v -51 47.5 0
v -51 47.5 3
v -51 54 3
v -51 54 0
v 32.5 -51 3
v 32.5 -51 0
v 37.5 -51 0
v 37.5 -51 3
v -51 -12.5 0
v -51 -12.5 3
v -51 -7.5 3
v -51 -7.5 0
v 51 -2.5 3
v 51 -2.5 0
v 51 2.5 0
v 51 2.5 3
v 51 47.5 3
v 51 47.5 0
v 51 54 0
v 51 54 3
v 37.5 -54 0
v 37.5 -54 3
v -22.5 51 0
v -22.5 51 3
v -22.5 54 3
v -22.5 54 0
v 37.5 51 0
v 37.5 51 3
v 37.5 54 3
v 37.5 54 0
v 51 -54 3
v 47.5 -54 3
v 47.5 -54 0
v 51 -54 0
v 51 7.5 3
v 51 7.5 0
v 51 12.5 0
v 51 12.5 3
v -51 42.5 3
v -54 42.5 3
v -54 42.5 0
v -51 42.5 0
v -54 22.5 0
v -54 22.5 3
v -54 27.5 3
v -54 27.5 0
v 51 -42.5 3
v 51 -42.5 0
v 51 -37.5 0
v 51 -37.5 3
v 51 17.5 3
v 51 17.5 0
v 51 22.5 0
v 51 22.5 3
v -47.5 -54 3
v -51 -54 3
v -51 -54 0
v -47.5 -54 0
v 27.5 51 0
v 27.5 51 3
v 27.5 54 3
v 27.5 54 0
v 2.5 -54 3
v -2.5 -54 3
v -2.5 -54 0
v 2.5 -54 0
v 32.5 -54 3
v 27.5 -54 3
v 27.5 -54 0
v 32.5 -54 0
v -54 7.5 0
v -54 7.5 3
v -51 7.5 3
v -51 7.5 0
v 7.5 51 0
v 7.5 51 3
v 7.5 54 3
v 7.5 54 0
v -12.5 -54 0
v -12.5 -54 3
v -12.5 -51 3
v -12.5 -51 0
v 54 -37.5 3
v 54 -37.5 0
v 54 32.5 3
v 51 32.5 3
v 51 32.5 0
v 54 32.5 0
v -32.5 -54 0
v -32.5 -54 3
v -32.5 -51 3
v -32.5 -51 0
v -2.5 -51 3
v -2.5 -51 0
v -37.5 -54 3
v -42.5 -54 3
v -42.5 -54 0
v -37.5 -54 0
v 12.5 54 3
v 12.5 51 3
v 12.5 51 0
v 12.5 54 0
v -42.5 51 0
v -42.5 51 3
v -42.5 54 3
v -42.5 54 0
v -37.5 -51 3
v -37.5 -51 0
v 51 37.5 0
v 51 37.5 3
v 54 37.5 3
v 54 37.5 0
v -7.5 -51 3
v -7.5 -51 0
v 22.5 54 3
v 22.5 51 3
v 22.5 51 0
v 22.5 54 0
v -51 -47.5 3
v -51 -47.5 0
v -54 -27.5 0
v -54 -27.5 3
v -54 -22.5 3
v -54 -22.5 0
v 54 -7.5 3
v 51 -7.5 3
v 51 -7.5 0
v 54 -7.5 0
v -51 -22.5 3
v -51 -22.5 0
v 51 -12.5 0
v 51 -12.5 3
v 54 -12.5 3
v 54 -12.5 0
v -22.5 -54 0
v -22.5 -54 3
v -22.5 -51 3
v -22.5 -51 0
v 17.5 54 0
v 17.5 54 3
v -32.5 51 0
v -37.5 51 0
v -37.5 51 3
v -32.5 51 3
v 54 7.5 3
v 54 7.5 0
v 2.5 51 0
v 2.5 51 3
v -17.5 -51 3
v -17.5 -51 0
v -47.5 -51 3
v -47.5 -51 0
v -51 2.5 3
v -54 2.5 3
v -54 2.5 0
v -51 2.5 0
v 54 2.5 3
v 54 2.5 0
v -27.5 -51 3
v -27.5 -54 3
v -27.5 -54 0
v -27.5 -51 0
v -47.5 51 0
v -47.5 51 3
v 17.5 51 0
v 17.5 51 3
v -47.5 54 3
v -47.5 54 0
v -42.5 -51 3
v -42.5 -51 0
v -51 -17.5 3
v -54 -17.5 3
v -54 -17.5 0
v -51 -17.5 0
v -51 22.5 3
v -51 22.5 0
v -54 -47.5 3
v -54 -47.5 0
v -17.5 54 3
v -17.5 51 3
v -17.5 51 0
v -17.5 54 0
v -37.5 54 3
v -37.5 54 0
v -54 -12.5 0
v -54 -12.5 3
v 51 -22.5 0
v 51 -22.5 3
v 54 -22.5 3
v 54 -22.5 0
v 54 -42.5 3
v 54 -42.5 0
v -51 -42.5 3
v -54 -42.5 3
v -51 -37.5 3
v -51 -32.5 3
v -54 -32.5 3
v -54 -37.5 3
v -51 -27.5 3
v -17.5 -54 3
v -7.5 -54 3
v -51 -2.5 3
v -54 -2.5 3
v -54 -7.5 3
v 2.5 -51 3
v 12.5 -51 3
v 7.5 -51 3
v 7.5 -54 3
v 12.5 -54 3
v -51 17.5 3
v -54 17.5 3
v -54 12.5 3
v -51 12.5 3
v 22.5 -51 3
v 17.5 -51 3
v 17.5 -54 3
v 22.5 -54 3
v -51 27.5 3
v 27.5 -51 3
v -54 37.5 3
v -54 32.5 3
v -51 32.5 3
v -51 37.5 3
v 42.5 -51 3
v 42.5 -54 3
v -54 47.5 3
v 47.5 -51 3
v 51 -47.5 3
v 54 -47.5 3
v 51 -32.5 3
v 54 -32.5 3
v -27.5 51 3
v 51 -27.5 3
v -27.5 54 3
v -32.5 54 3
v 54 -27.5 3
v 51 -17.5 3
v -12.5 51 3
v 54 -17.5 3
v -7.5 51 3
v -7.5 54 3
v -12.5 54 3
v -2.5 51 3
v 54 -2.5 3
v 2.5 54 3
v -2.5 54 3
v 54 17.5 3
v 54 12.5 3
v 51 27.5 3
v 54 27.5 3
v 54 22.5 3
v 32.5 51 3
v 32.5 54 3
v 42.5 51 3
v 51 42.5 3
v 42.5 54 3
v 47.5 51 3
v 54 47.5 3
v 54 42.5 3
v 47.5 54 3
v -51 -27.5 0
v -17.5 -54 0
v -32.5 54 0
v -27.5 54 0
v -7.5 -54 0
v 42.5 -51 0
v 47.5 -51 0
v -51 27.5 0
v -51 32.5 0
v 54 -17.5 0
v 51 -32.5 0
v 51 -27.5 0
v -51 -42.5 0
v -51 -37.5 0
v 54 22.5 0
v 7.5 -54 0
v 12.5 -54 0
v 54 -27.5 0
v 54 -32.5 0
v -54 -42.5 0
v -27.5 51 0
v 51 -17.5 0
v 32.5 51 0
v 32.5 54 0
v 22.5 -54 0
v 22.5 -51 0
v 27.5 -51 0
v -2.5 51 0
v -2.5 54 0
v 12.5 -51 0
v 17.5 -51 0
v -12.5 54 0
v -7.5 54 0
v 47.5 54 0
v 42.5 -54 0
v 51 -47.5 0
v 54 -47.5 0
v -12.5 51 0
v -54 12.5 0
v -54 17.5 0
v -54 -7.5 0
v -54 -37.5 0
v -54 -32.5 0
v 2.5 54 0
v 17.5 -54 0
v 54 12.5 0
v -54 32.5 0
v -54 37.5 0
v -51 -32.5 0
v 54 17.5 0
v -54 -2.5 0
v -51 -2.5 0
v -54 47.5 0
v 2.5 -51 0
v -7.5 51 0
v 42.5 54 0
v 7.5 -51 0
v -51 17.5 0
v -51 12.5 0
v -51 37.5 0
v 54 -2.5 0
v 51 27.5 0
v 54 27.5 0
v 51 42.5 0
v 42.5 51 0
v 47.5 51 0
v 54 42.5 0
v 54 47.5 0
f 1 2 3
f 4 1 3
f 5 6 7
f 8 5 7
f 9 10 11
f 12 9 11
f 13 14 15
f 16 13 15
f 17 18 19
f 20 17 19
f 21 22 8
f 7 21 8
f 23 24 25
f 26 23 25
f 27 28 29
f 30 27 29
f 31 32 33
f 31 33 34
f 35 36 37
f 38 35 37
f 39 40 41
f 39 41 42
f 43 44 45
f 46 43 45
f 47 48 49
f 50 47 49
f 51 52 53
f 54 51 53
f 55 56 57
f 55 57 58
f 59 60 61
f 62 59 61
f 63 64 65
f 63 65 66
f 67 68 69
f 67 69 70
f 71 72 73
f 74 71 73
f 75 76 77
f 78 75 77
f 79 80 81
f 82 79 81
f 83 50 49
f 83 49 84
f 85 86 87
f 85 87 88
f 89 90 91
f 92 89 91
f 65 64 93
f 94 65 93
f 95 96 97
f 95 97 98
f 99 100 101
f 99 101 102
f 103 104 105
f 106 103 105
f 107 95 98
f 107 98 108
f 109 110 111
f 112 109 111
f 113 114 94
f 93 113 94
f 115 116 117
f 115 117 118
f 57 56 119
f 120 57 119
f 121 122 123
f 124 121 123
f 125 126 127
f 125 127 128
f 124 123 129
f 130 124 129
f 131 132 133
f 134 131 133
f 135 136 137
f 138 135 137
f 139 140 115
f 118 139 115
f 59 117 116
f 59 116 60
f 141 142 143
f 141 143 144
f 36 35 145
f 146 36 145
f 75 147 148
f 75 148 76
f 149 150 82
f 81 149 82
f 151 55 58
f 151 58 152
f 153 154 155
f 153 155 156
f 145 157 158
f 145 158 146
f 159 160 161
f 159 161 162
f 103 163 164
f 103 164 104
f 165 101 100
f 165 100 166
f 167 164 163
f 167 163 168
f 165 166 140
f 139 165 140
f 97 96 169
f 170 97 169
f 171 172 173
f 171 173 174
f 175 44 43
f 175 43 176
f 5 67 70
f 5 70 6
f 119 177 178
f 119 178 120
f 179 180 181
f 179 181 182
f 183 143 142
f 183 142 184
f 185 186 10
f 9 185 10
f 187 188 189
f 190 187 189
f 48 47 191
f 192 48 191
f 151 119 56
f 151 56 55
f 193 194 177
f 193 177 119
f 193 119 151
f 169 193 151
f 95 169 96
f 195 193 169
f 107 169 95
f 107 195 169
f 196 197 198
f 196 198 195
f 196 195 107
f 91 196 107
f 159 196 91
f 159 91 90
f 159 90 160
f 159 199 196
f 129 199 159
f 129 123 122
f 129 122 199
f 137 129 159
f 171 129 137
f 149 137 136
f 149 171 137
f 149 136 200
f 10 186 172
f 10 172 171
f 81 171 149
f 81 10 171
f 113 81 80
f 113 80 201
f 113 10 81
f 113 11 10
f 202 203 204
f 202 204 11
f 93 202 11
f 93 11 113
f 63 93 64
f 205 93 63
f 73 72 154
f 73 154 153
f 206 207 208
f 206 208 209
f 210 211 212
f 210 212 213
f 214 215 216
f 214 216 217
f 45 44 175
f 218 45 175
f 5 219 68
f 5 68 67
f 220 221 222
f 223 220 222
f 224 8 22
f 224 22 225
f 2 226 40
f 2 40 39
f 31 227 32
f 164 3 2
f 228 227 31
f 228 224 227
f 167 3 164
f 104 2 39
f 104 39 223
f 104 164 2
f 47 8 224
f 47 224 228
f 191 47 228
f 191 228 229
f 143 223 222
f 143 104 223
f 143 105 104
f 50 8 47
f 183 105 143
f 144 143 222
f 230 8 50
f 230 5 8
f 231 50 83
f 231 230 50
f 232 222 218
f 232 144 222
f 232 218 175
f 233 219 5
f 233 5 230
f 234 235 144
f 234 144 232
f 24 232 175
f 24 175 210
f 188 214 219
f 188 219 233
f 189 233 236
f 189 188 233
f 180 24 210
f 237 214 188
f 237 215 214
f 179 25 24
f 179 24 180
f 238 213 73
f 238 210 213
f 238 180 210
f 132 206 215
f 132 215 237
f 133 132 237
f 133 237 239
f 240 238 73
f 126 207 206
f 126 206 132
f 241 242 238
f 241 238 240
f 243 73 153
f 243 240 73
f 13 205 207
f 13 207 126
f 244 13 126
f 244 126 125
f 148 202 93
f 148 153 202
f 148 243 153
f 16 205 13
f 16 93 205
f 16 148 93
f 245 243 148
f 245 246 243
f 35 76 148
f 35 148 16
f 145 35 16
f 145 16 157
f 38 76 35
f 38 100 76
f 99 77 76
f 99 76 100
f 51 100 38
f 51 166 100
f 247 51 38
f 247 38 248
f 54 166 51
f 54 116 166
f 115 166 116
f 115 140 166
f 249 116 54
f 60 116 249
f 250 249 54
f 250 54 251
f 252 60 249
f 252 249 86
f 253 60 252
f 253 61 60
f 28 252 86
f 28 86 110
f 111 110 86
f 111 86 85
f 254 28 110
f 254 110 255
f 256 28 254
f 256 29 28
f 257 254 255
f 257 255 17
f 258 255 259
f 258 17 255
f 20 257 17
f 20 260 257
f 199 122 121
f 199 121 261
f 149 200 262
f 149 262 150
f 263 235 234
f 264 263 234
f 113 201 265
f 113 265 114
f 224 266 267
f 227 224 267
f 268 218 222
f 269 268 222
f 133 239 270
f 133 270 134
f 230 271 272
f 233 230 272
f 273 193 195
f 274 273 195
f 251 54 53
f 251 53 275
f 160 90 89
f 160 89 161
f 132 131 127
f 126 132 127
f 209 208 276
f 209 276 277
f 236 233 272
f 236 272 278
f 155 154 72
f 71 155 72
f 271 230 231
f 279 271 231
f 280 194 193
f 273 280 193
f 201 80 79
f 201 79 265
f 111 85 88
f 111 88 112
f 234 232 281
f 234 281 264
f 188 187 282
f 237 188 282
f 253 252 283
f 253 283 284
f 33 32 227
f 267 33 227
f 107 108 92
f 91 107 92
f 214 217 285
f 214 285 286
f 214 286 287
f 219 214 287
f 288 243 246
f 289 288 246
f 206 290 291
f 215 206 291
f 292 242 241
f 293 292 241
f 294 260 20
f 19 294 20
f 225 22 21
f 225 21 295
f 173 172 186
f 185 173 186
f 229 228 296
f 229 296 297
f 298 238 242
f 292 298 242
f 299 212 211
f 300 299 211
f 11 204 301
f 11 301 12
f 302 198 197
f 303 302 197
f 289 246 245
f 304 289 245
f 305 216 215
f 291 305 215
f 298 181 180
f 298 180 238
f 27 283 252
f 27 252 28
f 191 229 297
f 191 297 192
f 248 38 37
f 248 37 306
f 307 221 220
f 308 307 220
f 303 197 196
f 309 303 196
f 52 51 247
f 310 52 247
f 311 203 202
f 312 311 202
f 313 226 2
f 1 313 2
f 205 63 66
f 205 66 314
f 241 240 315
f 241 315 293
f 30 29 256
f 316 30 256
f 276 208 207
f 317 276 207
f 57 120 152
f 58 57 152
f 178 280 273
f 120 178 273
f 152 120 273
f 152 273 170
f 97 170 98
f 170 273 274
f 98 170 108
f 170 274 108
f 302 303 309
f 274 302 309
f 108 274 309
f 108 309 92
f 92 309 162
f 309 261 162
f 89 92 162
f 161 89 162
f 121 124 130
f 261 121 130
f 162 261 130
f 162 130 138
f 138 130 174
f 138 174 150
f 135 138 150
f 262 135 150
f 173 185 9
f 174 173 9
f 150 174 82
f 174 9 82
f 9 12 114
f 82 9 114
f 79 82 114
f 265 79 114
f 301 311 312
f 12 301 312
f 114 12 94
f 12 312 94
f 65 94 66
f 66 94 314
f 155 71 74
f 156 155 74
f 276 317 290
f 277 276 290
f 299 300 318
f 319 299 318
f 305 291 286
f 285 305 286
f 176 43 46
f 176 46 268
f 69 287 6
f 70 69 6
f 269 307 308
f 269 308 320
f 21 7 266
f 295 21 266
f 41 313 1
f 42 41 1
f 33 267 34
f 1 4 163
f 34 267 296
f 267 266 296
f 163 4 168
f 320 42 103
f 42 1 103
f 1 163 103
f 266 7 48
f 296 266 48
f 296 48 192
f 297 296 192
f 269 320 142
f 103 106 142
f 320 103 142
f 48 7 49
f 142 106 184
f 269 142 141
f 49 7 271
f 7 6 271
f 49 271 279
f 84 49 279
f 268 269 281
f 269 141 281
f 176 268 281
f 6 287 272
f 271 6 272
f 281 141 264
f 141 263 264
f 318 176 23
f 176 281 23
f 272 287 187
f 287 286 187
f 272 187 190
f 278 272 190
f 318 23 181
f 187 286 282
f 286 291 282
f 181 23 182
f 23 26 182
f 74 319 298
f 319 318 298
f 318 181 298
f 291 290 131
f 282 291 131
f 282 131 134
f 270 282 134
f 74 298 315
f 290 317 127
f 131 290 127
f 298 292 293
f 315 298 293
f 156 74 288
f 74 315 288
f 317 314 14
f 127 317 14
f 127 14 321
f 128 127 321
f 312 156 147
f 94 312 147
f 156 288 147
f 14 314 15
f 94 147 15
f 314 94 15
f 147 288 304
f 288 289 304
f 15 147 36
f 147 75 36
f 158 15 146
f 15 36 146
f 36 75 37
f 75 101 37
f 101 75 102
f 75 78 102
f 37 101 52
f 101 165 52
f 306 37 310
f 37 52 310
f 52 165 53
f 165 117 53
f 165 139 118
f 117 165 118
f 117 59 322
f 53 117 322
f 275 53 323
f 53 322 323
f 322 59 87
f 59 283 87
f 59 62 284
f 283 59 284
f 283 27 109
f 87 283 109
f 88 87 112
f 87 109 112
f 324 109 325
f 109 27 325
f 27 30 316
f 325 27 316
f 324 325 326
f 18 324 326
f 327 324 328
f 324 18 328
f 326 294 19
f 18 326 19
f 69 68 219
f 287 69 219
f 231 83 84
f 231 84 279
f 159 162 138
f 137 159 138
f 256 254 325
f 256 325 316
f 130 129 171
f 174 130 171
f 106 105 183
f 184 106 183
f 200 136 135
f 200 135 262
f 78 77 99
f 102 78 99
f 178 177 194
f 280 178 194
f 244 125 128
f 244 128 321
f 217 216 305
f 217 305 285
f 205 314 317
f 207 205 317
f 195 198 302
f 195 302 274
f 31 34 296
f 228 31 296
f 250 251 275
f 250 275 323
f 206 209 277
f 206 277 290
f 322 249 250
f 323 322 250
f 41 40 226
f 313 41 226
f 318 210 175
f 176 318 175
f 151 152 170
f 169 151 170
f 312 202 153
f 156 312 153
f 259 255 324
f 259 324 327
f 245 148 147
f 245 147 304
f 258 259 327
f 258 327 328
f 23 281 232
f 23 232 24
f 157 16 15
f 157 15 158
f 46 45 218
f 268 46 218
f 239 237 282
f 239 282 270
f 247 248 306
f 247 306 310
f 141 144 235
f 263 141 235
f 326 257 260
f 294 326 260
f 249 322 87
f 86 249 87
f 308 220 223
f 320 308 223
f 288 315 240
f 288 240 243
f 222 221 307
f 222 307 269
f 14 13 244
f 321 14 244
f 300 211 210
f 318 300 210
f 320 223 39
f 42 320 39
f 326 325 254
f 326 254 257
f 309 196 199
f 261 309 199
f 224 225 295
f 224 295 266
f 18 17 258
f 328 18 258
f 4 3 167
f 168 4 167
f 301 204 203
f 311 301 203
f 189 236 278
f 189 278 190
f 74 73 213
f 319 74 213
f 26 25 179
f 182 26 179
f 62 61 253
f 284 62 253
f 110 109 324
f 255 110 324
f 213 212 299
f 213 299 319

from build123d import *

# Parameters (mm, degrees)
F0_W     = 102
F0_H     = 102
F1_DEPTH = 3
F2_W     = 5
F2_H     = 3
F2_W_2   = 3.5
F3_DEPTH = 3
F4_W     = 3
F4_H     = 5
F5_DEPTH = 3


with BuildPart() as f1:
    # F0 (on Top) → F1 (new body)
    with BuildSketch(Plane.XY):
        Rectangle(F0_W, F0_H)
    extrude(amount=F1_DEPTH)

    # F2 (on face) → F3 (join, through all)
    with BuildSketch(Plane.XY.offset(3)):
        with Locations((0, 52.5)):
            Rectangle(F2_W, F2_H)
        with Locations((10, 52.5)):
            Rectangle(F2_W, F2_H)
        with Locations((20, 52.5)):
            Rectangle(F2_W, F2_H)
        with Locations((30, 52.5)):
            Rectangle(F2_W, F2_H)
        with Locations((40, 52.5)):
            Rectangle(F2_W, F2_H)
        with Locations((-10, 52.5)):
            Rectangle(F2_W, F2_H)
        with Locations((-30, 52.5)):
            Rectangle(F2_W, F2_H)
        with Locations((-40, 52.5)):
            Rectangle(F2_W, F2_H)
        with Locations((-20, 52.5)):
            Rectangle(F2_W, F2_H)
        with Locations((-10, -52.5)):
            Rectangle(F2_W, F2_H)
        with Locations((0, -52.5)):
            Rectangle(F2_W, F2_H)
        with Locations((10, -52.5)):
            Rectangle(F2_W, F2_H)
        with Locations((40, -52.5)):
            Rectangle(F2_W, F2_H)
        with Locations((-20, -52.5)):
            Rectangle(F2_W, F2_H)
        with Locations((-30, -52.5)):
            Rectangle(F2_W, F2_H)
        with Locations((-40, -52.5)):
            Rectangle(F2_W, F2_H)
        with Locations((20, -52.5)):
            Rectangle(F2_W, F2_H)
        with Locations((30, -52.5)):
            Rectangle(F2_W, F2_H)
        with Locations((-49.25, 52.5)):
            Rectangle(F2_W_2, F2_H)
        with Locations((49.25, 52.5)):
            Rectangle(F2_W_2, F2_H)
        with Locations((49.25, -52.5)):
            Rectangle(F2_W_2, F2_H)
        with Locations((-49.25, -52.5)):
            Rectangle(F2_W_2, F2_H)
    extrude(amount=-F3_DEPTH)

    # F4 (on face) → F5 (join)
    with BuildSketch(Plane.XY.offset(3)):
        with Locations((52.5, -5)):
            Rectangle(F4_W, F4_H)
        with Locations((52.5, -15)):
            Rectangle(F4_W, F4_H)
        with Locations((52.5, -25)):
            Rectangle(F4_W, F4_H)
        with Locations((52.5, -35)):
            Rectangle(F4_W, F4_H)
        with Locations((52.5, -45)):
            Rectangle(F4_W, F4_H)
        with Locations((52.5, 15)):
            Rectangle(F4_W, F4_H)
        with Locations((52.5, 45)):
            Rectangle(F4_W, F4_H)
        with Locations((52.5, 25)):
            Rectangle(F4_W, F4_H)
        with Locations((52.5, 5)):
            Rectangle(F4_W, F4_H)
        with Locations((52.5, 35)):
            Rectangle(F4_W, F4_H)
        with Locations((-52.5, -15)):
            Rectangle(F4_W, F4_H)
        with Locations((-52.5, -5)):
            Rectangle(F4_W, F4_H)
        with Locations((-52.5, 15)):
            Rectangle(F4_W, F4_H)
        with Locations((-52.5, 35)):
            Rectangle(F4_W, F4_H)
        with Locations((-52.5, -25)):
            Rectangle(F4_W, F4_H)
        with Locations((-52.5, 25)):
            Rectangle(F4_W, F4_H)
        with Locations((-52.5, -35)):
            Rectangle(F4_W, F4_H)
        with Locations((-52.5, 45)):
            Rectangle(F4_W, F4_H)
        with Locations((-52.5, -45)):
            Rectangle(F4_W, F4_H)
        with Locations((-52.5, 5)):
            Rectangle(F4_W, F4_H)
    extrude(amount=-F5_DEPTH)


solid = f1.part
